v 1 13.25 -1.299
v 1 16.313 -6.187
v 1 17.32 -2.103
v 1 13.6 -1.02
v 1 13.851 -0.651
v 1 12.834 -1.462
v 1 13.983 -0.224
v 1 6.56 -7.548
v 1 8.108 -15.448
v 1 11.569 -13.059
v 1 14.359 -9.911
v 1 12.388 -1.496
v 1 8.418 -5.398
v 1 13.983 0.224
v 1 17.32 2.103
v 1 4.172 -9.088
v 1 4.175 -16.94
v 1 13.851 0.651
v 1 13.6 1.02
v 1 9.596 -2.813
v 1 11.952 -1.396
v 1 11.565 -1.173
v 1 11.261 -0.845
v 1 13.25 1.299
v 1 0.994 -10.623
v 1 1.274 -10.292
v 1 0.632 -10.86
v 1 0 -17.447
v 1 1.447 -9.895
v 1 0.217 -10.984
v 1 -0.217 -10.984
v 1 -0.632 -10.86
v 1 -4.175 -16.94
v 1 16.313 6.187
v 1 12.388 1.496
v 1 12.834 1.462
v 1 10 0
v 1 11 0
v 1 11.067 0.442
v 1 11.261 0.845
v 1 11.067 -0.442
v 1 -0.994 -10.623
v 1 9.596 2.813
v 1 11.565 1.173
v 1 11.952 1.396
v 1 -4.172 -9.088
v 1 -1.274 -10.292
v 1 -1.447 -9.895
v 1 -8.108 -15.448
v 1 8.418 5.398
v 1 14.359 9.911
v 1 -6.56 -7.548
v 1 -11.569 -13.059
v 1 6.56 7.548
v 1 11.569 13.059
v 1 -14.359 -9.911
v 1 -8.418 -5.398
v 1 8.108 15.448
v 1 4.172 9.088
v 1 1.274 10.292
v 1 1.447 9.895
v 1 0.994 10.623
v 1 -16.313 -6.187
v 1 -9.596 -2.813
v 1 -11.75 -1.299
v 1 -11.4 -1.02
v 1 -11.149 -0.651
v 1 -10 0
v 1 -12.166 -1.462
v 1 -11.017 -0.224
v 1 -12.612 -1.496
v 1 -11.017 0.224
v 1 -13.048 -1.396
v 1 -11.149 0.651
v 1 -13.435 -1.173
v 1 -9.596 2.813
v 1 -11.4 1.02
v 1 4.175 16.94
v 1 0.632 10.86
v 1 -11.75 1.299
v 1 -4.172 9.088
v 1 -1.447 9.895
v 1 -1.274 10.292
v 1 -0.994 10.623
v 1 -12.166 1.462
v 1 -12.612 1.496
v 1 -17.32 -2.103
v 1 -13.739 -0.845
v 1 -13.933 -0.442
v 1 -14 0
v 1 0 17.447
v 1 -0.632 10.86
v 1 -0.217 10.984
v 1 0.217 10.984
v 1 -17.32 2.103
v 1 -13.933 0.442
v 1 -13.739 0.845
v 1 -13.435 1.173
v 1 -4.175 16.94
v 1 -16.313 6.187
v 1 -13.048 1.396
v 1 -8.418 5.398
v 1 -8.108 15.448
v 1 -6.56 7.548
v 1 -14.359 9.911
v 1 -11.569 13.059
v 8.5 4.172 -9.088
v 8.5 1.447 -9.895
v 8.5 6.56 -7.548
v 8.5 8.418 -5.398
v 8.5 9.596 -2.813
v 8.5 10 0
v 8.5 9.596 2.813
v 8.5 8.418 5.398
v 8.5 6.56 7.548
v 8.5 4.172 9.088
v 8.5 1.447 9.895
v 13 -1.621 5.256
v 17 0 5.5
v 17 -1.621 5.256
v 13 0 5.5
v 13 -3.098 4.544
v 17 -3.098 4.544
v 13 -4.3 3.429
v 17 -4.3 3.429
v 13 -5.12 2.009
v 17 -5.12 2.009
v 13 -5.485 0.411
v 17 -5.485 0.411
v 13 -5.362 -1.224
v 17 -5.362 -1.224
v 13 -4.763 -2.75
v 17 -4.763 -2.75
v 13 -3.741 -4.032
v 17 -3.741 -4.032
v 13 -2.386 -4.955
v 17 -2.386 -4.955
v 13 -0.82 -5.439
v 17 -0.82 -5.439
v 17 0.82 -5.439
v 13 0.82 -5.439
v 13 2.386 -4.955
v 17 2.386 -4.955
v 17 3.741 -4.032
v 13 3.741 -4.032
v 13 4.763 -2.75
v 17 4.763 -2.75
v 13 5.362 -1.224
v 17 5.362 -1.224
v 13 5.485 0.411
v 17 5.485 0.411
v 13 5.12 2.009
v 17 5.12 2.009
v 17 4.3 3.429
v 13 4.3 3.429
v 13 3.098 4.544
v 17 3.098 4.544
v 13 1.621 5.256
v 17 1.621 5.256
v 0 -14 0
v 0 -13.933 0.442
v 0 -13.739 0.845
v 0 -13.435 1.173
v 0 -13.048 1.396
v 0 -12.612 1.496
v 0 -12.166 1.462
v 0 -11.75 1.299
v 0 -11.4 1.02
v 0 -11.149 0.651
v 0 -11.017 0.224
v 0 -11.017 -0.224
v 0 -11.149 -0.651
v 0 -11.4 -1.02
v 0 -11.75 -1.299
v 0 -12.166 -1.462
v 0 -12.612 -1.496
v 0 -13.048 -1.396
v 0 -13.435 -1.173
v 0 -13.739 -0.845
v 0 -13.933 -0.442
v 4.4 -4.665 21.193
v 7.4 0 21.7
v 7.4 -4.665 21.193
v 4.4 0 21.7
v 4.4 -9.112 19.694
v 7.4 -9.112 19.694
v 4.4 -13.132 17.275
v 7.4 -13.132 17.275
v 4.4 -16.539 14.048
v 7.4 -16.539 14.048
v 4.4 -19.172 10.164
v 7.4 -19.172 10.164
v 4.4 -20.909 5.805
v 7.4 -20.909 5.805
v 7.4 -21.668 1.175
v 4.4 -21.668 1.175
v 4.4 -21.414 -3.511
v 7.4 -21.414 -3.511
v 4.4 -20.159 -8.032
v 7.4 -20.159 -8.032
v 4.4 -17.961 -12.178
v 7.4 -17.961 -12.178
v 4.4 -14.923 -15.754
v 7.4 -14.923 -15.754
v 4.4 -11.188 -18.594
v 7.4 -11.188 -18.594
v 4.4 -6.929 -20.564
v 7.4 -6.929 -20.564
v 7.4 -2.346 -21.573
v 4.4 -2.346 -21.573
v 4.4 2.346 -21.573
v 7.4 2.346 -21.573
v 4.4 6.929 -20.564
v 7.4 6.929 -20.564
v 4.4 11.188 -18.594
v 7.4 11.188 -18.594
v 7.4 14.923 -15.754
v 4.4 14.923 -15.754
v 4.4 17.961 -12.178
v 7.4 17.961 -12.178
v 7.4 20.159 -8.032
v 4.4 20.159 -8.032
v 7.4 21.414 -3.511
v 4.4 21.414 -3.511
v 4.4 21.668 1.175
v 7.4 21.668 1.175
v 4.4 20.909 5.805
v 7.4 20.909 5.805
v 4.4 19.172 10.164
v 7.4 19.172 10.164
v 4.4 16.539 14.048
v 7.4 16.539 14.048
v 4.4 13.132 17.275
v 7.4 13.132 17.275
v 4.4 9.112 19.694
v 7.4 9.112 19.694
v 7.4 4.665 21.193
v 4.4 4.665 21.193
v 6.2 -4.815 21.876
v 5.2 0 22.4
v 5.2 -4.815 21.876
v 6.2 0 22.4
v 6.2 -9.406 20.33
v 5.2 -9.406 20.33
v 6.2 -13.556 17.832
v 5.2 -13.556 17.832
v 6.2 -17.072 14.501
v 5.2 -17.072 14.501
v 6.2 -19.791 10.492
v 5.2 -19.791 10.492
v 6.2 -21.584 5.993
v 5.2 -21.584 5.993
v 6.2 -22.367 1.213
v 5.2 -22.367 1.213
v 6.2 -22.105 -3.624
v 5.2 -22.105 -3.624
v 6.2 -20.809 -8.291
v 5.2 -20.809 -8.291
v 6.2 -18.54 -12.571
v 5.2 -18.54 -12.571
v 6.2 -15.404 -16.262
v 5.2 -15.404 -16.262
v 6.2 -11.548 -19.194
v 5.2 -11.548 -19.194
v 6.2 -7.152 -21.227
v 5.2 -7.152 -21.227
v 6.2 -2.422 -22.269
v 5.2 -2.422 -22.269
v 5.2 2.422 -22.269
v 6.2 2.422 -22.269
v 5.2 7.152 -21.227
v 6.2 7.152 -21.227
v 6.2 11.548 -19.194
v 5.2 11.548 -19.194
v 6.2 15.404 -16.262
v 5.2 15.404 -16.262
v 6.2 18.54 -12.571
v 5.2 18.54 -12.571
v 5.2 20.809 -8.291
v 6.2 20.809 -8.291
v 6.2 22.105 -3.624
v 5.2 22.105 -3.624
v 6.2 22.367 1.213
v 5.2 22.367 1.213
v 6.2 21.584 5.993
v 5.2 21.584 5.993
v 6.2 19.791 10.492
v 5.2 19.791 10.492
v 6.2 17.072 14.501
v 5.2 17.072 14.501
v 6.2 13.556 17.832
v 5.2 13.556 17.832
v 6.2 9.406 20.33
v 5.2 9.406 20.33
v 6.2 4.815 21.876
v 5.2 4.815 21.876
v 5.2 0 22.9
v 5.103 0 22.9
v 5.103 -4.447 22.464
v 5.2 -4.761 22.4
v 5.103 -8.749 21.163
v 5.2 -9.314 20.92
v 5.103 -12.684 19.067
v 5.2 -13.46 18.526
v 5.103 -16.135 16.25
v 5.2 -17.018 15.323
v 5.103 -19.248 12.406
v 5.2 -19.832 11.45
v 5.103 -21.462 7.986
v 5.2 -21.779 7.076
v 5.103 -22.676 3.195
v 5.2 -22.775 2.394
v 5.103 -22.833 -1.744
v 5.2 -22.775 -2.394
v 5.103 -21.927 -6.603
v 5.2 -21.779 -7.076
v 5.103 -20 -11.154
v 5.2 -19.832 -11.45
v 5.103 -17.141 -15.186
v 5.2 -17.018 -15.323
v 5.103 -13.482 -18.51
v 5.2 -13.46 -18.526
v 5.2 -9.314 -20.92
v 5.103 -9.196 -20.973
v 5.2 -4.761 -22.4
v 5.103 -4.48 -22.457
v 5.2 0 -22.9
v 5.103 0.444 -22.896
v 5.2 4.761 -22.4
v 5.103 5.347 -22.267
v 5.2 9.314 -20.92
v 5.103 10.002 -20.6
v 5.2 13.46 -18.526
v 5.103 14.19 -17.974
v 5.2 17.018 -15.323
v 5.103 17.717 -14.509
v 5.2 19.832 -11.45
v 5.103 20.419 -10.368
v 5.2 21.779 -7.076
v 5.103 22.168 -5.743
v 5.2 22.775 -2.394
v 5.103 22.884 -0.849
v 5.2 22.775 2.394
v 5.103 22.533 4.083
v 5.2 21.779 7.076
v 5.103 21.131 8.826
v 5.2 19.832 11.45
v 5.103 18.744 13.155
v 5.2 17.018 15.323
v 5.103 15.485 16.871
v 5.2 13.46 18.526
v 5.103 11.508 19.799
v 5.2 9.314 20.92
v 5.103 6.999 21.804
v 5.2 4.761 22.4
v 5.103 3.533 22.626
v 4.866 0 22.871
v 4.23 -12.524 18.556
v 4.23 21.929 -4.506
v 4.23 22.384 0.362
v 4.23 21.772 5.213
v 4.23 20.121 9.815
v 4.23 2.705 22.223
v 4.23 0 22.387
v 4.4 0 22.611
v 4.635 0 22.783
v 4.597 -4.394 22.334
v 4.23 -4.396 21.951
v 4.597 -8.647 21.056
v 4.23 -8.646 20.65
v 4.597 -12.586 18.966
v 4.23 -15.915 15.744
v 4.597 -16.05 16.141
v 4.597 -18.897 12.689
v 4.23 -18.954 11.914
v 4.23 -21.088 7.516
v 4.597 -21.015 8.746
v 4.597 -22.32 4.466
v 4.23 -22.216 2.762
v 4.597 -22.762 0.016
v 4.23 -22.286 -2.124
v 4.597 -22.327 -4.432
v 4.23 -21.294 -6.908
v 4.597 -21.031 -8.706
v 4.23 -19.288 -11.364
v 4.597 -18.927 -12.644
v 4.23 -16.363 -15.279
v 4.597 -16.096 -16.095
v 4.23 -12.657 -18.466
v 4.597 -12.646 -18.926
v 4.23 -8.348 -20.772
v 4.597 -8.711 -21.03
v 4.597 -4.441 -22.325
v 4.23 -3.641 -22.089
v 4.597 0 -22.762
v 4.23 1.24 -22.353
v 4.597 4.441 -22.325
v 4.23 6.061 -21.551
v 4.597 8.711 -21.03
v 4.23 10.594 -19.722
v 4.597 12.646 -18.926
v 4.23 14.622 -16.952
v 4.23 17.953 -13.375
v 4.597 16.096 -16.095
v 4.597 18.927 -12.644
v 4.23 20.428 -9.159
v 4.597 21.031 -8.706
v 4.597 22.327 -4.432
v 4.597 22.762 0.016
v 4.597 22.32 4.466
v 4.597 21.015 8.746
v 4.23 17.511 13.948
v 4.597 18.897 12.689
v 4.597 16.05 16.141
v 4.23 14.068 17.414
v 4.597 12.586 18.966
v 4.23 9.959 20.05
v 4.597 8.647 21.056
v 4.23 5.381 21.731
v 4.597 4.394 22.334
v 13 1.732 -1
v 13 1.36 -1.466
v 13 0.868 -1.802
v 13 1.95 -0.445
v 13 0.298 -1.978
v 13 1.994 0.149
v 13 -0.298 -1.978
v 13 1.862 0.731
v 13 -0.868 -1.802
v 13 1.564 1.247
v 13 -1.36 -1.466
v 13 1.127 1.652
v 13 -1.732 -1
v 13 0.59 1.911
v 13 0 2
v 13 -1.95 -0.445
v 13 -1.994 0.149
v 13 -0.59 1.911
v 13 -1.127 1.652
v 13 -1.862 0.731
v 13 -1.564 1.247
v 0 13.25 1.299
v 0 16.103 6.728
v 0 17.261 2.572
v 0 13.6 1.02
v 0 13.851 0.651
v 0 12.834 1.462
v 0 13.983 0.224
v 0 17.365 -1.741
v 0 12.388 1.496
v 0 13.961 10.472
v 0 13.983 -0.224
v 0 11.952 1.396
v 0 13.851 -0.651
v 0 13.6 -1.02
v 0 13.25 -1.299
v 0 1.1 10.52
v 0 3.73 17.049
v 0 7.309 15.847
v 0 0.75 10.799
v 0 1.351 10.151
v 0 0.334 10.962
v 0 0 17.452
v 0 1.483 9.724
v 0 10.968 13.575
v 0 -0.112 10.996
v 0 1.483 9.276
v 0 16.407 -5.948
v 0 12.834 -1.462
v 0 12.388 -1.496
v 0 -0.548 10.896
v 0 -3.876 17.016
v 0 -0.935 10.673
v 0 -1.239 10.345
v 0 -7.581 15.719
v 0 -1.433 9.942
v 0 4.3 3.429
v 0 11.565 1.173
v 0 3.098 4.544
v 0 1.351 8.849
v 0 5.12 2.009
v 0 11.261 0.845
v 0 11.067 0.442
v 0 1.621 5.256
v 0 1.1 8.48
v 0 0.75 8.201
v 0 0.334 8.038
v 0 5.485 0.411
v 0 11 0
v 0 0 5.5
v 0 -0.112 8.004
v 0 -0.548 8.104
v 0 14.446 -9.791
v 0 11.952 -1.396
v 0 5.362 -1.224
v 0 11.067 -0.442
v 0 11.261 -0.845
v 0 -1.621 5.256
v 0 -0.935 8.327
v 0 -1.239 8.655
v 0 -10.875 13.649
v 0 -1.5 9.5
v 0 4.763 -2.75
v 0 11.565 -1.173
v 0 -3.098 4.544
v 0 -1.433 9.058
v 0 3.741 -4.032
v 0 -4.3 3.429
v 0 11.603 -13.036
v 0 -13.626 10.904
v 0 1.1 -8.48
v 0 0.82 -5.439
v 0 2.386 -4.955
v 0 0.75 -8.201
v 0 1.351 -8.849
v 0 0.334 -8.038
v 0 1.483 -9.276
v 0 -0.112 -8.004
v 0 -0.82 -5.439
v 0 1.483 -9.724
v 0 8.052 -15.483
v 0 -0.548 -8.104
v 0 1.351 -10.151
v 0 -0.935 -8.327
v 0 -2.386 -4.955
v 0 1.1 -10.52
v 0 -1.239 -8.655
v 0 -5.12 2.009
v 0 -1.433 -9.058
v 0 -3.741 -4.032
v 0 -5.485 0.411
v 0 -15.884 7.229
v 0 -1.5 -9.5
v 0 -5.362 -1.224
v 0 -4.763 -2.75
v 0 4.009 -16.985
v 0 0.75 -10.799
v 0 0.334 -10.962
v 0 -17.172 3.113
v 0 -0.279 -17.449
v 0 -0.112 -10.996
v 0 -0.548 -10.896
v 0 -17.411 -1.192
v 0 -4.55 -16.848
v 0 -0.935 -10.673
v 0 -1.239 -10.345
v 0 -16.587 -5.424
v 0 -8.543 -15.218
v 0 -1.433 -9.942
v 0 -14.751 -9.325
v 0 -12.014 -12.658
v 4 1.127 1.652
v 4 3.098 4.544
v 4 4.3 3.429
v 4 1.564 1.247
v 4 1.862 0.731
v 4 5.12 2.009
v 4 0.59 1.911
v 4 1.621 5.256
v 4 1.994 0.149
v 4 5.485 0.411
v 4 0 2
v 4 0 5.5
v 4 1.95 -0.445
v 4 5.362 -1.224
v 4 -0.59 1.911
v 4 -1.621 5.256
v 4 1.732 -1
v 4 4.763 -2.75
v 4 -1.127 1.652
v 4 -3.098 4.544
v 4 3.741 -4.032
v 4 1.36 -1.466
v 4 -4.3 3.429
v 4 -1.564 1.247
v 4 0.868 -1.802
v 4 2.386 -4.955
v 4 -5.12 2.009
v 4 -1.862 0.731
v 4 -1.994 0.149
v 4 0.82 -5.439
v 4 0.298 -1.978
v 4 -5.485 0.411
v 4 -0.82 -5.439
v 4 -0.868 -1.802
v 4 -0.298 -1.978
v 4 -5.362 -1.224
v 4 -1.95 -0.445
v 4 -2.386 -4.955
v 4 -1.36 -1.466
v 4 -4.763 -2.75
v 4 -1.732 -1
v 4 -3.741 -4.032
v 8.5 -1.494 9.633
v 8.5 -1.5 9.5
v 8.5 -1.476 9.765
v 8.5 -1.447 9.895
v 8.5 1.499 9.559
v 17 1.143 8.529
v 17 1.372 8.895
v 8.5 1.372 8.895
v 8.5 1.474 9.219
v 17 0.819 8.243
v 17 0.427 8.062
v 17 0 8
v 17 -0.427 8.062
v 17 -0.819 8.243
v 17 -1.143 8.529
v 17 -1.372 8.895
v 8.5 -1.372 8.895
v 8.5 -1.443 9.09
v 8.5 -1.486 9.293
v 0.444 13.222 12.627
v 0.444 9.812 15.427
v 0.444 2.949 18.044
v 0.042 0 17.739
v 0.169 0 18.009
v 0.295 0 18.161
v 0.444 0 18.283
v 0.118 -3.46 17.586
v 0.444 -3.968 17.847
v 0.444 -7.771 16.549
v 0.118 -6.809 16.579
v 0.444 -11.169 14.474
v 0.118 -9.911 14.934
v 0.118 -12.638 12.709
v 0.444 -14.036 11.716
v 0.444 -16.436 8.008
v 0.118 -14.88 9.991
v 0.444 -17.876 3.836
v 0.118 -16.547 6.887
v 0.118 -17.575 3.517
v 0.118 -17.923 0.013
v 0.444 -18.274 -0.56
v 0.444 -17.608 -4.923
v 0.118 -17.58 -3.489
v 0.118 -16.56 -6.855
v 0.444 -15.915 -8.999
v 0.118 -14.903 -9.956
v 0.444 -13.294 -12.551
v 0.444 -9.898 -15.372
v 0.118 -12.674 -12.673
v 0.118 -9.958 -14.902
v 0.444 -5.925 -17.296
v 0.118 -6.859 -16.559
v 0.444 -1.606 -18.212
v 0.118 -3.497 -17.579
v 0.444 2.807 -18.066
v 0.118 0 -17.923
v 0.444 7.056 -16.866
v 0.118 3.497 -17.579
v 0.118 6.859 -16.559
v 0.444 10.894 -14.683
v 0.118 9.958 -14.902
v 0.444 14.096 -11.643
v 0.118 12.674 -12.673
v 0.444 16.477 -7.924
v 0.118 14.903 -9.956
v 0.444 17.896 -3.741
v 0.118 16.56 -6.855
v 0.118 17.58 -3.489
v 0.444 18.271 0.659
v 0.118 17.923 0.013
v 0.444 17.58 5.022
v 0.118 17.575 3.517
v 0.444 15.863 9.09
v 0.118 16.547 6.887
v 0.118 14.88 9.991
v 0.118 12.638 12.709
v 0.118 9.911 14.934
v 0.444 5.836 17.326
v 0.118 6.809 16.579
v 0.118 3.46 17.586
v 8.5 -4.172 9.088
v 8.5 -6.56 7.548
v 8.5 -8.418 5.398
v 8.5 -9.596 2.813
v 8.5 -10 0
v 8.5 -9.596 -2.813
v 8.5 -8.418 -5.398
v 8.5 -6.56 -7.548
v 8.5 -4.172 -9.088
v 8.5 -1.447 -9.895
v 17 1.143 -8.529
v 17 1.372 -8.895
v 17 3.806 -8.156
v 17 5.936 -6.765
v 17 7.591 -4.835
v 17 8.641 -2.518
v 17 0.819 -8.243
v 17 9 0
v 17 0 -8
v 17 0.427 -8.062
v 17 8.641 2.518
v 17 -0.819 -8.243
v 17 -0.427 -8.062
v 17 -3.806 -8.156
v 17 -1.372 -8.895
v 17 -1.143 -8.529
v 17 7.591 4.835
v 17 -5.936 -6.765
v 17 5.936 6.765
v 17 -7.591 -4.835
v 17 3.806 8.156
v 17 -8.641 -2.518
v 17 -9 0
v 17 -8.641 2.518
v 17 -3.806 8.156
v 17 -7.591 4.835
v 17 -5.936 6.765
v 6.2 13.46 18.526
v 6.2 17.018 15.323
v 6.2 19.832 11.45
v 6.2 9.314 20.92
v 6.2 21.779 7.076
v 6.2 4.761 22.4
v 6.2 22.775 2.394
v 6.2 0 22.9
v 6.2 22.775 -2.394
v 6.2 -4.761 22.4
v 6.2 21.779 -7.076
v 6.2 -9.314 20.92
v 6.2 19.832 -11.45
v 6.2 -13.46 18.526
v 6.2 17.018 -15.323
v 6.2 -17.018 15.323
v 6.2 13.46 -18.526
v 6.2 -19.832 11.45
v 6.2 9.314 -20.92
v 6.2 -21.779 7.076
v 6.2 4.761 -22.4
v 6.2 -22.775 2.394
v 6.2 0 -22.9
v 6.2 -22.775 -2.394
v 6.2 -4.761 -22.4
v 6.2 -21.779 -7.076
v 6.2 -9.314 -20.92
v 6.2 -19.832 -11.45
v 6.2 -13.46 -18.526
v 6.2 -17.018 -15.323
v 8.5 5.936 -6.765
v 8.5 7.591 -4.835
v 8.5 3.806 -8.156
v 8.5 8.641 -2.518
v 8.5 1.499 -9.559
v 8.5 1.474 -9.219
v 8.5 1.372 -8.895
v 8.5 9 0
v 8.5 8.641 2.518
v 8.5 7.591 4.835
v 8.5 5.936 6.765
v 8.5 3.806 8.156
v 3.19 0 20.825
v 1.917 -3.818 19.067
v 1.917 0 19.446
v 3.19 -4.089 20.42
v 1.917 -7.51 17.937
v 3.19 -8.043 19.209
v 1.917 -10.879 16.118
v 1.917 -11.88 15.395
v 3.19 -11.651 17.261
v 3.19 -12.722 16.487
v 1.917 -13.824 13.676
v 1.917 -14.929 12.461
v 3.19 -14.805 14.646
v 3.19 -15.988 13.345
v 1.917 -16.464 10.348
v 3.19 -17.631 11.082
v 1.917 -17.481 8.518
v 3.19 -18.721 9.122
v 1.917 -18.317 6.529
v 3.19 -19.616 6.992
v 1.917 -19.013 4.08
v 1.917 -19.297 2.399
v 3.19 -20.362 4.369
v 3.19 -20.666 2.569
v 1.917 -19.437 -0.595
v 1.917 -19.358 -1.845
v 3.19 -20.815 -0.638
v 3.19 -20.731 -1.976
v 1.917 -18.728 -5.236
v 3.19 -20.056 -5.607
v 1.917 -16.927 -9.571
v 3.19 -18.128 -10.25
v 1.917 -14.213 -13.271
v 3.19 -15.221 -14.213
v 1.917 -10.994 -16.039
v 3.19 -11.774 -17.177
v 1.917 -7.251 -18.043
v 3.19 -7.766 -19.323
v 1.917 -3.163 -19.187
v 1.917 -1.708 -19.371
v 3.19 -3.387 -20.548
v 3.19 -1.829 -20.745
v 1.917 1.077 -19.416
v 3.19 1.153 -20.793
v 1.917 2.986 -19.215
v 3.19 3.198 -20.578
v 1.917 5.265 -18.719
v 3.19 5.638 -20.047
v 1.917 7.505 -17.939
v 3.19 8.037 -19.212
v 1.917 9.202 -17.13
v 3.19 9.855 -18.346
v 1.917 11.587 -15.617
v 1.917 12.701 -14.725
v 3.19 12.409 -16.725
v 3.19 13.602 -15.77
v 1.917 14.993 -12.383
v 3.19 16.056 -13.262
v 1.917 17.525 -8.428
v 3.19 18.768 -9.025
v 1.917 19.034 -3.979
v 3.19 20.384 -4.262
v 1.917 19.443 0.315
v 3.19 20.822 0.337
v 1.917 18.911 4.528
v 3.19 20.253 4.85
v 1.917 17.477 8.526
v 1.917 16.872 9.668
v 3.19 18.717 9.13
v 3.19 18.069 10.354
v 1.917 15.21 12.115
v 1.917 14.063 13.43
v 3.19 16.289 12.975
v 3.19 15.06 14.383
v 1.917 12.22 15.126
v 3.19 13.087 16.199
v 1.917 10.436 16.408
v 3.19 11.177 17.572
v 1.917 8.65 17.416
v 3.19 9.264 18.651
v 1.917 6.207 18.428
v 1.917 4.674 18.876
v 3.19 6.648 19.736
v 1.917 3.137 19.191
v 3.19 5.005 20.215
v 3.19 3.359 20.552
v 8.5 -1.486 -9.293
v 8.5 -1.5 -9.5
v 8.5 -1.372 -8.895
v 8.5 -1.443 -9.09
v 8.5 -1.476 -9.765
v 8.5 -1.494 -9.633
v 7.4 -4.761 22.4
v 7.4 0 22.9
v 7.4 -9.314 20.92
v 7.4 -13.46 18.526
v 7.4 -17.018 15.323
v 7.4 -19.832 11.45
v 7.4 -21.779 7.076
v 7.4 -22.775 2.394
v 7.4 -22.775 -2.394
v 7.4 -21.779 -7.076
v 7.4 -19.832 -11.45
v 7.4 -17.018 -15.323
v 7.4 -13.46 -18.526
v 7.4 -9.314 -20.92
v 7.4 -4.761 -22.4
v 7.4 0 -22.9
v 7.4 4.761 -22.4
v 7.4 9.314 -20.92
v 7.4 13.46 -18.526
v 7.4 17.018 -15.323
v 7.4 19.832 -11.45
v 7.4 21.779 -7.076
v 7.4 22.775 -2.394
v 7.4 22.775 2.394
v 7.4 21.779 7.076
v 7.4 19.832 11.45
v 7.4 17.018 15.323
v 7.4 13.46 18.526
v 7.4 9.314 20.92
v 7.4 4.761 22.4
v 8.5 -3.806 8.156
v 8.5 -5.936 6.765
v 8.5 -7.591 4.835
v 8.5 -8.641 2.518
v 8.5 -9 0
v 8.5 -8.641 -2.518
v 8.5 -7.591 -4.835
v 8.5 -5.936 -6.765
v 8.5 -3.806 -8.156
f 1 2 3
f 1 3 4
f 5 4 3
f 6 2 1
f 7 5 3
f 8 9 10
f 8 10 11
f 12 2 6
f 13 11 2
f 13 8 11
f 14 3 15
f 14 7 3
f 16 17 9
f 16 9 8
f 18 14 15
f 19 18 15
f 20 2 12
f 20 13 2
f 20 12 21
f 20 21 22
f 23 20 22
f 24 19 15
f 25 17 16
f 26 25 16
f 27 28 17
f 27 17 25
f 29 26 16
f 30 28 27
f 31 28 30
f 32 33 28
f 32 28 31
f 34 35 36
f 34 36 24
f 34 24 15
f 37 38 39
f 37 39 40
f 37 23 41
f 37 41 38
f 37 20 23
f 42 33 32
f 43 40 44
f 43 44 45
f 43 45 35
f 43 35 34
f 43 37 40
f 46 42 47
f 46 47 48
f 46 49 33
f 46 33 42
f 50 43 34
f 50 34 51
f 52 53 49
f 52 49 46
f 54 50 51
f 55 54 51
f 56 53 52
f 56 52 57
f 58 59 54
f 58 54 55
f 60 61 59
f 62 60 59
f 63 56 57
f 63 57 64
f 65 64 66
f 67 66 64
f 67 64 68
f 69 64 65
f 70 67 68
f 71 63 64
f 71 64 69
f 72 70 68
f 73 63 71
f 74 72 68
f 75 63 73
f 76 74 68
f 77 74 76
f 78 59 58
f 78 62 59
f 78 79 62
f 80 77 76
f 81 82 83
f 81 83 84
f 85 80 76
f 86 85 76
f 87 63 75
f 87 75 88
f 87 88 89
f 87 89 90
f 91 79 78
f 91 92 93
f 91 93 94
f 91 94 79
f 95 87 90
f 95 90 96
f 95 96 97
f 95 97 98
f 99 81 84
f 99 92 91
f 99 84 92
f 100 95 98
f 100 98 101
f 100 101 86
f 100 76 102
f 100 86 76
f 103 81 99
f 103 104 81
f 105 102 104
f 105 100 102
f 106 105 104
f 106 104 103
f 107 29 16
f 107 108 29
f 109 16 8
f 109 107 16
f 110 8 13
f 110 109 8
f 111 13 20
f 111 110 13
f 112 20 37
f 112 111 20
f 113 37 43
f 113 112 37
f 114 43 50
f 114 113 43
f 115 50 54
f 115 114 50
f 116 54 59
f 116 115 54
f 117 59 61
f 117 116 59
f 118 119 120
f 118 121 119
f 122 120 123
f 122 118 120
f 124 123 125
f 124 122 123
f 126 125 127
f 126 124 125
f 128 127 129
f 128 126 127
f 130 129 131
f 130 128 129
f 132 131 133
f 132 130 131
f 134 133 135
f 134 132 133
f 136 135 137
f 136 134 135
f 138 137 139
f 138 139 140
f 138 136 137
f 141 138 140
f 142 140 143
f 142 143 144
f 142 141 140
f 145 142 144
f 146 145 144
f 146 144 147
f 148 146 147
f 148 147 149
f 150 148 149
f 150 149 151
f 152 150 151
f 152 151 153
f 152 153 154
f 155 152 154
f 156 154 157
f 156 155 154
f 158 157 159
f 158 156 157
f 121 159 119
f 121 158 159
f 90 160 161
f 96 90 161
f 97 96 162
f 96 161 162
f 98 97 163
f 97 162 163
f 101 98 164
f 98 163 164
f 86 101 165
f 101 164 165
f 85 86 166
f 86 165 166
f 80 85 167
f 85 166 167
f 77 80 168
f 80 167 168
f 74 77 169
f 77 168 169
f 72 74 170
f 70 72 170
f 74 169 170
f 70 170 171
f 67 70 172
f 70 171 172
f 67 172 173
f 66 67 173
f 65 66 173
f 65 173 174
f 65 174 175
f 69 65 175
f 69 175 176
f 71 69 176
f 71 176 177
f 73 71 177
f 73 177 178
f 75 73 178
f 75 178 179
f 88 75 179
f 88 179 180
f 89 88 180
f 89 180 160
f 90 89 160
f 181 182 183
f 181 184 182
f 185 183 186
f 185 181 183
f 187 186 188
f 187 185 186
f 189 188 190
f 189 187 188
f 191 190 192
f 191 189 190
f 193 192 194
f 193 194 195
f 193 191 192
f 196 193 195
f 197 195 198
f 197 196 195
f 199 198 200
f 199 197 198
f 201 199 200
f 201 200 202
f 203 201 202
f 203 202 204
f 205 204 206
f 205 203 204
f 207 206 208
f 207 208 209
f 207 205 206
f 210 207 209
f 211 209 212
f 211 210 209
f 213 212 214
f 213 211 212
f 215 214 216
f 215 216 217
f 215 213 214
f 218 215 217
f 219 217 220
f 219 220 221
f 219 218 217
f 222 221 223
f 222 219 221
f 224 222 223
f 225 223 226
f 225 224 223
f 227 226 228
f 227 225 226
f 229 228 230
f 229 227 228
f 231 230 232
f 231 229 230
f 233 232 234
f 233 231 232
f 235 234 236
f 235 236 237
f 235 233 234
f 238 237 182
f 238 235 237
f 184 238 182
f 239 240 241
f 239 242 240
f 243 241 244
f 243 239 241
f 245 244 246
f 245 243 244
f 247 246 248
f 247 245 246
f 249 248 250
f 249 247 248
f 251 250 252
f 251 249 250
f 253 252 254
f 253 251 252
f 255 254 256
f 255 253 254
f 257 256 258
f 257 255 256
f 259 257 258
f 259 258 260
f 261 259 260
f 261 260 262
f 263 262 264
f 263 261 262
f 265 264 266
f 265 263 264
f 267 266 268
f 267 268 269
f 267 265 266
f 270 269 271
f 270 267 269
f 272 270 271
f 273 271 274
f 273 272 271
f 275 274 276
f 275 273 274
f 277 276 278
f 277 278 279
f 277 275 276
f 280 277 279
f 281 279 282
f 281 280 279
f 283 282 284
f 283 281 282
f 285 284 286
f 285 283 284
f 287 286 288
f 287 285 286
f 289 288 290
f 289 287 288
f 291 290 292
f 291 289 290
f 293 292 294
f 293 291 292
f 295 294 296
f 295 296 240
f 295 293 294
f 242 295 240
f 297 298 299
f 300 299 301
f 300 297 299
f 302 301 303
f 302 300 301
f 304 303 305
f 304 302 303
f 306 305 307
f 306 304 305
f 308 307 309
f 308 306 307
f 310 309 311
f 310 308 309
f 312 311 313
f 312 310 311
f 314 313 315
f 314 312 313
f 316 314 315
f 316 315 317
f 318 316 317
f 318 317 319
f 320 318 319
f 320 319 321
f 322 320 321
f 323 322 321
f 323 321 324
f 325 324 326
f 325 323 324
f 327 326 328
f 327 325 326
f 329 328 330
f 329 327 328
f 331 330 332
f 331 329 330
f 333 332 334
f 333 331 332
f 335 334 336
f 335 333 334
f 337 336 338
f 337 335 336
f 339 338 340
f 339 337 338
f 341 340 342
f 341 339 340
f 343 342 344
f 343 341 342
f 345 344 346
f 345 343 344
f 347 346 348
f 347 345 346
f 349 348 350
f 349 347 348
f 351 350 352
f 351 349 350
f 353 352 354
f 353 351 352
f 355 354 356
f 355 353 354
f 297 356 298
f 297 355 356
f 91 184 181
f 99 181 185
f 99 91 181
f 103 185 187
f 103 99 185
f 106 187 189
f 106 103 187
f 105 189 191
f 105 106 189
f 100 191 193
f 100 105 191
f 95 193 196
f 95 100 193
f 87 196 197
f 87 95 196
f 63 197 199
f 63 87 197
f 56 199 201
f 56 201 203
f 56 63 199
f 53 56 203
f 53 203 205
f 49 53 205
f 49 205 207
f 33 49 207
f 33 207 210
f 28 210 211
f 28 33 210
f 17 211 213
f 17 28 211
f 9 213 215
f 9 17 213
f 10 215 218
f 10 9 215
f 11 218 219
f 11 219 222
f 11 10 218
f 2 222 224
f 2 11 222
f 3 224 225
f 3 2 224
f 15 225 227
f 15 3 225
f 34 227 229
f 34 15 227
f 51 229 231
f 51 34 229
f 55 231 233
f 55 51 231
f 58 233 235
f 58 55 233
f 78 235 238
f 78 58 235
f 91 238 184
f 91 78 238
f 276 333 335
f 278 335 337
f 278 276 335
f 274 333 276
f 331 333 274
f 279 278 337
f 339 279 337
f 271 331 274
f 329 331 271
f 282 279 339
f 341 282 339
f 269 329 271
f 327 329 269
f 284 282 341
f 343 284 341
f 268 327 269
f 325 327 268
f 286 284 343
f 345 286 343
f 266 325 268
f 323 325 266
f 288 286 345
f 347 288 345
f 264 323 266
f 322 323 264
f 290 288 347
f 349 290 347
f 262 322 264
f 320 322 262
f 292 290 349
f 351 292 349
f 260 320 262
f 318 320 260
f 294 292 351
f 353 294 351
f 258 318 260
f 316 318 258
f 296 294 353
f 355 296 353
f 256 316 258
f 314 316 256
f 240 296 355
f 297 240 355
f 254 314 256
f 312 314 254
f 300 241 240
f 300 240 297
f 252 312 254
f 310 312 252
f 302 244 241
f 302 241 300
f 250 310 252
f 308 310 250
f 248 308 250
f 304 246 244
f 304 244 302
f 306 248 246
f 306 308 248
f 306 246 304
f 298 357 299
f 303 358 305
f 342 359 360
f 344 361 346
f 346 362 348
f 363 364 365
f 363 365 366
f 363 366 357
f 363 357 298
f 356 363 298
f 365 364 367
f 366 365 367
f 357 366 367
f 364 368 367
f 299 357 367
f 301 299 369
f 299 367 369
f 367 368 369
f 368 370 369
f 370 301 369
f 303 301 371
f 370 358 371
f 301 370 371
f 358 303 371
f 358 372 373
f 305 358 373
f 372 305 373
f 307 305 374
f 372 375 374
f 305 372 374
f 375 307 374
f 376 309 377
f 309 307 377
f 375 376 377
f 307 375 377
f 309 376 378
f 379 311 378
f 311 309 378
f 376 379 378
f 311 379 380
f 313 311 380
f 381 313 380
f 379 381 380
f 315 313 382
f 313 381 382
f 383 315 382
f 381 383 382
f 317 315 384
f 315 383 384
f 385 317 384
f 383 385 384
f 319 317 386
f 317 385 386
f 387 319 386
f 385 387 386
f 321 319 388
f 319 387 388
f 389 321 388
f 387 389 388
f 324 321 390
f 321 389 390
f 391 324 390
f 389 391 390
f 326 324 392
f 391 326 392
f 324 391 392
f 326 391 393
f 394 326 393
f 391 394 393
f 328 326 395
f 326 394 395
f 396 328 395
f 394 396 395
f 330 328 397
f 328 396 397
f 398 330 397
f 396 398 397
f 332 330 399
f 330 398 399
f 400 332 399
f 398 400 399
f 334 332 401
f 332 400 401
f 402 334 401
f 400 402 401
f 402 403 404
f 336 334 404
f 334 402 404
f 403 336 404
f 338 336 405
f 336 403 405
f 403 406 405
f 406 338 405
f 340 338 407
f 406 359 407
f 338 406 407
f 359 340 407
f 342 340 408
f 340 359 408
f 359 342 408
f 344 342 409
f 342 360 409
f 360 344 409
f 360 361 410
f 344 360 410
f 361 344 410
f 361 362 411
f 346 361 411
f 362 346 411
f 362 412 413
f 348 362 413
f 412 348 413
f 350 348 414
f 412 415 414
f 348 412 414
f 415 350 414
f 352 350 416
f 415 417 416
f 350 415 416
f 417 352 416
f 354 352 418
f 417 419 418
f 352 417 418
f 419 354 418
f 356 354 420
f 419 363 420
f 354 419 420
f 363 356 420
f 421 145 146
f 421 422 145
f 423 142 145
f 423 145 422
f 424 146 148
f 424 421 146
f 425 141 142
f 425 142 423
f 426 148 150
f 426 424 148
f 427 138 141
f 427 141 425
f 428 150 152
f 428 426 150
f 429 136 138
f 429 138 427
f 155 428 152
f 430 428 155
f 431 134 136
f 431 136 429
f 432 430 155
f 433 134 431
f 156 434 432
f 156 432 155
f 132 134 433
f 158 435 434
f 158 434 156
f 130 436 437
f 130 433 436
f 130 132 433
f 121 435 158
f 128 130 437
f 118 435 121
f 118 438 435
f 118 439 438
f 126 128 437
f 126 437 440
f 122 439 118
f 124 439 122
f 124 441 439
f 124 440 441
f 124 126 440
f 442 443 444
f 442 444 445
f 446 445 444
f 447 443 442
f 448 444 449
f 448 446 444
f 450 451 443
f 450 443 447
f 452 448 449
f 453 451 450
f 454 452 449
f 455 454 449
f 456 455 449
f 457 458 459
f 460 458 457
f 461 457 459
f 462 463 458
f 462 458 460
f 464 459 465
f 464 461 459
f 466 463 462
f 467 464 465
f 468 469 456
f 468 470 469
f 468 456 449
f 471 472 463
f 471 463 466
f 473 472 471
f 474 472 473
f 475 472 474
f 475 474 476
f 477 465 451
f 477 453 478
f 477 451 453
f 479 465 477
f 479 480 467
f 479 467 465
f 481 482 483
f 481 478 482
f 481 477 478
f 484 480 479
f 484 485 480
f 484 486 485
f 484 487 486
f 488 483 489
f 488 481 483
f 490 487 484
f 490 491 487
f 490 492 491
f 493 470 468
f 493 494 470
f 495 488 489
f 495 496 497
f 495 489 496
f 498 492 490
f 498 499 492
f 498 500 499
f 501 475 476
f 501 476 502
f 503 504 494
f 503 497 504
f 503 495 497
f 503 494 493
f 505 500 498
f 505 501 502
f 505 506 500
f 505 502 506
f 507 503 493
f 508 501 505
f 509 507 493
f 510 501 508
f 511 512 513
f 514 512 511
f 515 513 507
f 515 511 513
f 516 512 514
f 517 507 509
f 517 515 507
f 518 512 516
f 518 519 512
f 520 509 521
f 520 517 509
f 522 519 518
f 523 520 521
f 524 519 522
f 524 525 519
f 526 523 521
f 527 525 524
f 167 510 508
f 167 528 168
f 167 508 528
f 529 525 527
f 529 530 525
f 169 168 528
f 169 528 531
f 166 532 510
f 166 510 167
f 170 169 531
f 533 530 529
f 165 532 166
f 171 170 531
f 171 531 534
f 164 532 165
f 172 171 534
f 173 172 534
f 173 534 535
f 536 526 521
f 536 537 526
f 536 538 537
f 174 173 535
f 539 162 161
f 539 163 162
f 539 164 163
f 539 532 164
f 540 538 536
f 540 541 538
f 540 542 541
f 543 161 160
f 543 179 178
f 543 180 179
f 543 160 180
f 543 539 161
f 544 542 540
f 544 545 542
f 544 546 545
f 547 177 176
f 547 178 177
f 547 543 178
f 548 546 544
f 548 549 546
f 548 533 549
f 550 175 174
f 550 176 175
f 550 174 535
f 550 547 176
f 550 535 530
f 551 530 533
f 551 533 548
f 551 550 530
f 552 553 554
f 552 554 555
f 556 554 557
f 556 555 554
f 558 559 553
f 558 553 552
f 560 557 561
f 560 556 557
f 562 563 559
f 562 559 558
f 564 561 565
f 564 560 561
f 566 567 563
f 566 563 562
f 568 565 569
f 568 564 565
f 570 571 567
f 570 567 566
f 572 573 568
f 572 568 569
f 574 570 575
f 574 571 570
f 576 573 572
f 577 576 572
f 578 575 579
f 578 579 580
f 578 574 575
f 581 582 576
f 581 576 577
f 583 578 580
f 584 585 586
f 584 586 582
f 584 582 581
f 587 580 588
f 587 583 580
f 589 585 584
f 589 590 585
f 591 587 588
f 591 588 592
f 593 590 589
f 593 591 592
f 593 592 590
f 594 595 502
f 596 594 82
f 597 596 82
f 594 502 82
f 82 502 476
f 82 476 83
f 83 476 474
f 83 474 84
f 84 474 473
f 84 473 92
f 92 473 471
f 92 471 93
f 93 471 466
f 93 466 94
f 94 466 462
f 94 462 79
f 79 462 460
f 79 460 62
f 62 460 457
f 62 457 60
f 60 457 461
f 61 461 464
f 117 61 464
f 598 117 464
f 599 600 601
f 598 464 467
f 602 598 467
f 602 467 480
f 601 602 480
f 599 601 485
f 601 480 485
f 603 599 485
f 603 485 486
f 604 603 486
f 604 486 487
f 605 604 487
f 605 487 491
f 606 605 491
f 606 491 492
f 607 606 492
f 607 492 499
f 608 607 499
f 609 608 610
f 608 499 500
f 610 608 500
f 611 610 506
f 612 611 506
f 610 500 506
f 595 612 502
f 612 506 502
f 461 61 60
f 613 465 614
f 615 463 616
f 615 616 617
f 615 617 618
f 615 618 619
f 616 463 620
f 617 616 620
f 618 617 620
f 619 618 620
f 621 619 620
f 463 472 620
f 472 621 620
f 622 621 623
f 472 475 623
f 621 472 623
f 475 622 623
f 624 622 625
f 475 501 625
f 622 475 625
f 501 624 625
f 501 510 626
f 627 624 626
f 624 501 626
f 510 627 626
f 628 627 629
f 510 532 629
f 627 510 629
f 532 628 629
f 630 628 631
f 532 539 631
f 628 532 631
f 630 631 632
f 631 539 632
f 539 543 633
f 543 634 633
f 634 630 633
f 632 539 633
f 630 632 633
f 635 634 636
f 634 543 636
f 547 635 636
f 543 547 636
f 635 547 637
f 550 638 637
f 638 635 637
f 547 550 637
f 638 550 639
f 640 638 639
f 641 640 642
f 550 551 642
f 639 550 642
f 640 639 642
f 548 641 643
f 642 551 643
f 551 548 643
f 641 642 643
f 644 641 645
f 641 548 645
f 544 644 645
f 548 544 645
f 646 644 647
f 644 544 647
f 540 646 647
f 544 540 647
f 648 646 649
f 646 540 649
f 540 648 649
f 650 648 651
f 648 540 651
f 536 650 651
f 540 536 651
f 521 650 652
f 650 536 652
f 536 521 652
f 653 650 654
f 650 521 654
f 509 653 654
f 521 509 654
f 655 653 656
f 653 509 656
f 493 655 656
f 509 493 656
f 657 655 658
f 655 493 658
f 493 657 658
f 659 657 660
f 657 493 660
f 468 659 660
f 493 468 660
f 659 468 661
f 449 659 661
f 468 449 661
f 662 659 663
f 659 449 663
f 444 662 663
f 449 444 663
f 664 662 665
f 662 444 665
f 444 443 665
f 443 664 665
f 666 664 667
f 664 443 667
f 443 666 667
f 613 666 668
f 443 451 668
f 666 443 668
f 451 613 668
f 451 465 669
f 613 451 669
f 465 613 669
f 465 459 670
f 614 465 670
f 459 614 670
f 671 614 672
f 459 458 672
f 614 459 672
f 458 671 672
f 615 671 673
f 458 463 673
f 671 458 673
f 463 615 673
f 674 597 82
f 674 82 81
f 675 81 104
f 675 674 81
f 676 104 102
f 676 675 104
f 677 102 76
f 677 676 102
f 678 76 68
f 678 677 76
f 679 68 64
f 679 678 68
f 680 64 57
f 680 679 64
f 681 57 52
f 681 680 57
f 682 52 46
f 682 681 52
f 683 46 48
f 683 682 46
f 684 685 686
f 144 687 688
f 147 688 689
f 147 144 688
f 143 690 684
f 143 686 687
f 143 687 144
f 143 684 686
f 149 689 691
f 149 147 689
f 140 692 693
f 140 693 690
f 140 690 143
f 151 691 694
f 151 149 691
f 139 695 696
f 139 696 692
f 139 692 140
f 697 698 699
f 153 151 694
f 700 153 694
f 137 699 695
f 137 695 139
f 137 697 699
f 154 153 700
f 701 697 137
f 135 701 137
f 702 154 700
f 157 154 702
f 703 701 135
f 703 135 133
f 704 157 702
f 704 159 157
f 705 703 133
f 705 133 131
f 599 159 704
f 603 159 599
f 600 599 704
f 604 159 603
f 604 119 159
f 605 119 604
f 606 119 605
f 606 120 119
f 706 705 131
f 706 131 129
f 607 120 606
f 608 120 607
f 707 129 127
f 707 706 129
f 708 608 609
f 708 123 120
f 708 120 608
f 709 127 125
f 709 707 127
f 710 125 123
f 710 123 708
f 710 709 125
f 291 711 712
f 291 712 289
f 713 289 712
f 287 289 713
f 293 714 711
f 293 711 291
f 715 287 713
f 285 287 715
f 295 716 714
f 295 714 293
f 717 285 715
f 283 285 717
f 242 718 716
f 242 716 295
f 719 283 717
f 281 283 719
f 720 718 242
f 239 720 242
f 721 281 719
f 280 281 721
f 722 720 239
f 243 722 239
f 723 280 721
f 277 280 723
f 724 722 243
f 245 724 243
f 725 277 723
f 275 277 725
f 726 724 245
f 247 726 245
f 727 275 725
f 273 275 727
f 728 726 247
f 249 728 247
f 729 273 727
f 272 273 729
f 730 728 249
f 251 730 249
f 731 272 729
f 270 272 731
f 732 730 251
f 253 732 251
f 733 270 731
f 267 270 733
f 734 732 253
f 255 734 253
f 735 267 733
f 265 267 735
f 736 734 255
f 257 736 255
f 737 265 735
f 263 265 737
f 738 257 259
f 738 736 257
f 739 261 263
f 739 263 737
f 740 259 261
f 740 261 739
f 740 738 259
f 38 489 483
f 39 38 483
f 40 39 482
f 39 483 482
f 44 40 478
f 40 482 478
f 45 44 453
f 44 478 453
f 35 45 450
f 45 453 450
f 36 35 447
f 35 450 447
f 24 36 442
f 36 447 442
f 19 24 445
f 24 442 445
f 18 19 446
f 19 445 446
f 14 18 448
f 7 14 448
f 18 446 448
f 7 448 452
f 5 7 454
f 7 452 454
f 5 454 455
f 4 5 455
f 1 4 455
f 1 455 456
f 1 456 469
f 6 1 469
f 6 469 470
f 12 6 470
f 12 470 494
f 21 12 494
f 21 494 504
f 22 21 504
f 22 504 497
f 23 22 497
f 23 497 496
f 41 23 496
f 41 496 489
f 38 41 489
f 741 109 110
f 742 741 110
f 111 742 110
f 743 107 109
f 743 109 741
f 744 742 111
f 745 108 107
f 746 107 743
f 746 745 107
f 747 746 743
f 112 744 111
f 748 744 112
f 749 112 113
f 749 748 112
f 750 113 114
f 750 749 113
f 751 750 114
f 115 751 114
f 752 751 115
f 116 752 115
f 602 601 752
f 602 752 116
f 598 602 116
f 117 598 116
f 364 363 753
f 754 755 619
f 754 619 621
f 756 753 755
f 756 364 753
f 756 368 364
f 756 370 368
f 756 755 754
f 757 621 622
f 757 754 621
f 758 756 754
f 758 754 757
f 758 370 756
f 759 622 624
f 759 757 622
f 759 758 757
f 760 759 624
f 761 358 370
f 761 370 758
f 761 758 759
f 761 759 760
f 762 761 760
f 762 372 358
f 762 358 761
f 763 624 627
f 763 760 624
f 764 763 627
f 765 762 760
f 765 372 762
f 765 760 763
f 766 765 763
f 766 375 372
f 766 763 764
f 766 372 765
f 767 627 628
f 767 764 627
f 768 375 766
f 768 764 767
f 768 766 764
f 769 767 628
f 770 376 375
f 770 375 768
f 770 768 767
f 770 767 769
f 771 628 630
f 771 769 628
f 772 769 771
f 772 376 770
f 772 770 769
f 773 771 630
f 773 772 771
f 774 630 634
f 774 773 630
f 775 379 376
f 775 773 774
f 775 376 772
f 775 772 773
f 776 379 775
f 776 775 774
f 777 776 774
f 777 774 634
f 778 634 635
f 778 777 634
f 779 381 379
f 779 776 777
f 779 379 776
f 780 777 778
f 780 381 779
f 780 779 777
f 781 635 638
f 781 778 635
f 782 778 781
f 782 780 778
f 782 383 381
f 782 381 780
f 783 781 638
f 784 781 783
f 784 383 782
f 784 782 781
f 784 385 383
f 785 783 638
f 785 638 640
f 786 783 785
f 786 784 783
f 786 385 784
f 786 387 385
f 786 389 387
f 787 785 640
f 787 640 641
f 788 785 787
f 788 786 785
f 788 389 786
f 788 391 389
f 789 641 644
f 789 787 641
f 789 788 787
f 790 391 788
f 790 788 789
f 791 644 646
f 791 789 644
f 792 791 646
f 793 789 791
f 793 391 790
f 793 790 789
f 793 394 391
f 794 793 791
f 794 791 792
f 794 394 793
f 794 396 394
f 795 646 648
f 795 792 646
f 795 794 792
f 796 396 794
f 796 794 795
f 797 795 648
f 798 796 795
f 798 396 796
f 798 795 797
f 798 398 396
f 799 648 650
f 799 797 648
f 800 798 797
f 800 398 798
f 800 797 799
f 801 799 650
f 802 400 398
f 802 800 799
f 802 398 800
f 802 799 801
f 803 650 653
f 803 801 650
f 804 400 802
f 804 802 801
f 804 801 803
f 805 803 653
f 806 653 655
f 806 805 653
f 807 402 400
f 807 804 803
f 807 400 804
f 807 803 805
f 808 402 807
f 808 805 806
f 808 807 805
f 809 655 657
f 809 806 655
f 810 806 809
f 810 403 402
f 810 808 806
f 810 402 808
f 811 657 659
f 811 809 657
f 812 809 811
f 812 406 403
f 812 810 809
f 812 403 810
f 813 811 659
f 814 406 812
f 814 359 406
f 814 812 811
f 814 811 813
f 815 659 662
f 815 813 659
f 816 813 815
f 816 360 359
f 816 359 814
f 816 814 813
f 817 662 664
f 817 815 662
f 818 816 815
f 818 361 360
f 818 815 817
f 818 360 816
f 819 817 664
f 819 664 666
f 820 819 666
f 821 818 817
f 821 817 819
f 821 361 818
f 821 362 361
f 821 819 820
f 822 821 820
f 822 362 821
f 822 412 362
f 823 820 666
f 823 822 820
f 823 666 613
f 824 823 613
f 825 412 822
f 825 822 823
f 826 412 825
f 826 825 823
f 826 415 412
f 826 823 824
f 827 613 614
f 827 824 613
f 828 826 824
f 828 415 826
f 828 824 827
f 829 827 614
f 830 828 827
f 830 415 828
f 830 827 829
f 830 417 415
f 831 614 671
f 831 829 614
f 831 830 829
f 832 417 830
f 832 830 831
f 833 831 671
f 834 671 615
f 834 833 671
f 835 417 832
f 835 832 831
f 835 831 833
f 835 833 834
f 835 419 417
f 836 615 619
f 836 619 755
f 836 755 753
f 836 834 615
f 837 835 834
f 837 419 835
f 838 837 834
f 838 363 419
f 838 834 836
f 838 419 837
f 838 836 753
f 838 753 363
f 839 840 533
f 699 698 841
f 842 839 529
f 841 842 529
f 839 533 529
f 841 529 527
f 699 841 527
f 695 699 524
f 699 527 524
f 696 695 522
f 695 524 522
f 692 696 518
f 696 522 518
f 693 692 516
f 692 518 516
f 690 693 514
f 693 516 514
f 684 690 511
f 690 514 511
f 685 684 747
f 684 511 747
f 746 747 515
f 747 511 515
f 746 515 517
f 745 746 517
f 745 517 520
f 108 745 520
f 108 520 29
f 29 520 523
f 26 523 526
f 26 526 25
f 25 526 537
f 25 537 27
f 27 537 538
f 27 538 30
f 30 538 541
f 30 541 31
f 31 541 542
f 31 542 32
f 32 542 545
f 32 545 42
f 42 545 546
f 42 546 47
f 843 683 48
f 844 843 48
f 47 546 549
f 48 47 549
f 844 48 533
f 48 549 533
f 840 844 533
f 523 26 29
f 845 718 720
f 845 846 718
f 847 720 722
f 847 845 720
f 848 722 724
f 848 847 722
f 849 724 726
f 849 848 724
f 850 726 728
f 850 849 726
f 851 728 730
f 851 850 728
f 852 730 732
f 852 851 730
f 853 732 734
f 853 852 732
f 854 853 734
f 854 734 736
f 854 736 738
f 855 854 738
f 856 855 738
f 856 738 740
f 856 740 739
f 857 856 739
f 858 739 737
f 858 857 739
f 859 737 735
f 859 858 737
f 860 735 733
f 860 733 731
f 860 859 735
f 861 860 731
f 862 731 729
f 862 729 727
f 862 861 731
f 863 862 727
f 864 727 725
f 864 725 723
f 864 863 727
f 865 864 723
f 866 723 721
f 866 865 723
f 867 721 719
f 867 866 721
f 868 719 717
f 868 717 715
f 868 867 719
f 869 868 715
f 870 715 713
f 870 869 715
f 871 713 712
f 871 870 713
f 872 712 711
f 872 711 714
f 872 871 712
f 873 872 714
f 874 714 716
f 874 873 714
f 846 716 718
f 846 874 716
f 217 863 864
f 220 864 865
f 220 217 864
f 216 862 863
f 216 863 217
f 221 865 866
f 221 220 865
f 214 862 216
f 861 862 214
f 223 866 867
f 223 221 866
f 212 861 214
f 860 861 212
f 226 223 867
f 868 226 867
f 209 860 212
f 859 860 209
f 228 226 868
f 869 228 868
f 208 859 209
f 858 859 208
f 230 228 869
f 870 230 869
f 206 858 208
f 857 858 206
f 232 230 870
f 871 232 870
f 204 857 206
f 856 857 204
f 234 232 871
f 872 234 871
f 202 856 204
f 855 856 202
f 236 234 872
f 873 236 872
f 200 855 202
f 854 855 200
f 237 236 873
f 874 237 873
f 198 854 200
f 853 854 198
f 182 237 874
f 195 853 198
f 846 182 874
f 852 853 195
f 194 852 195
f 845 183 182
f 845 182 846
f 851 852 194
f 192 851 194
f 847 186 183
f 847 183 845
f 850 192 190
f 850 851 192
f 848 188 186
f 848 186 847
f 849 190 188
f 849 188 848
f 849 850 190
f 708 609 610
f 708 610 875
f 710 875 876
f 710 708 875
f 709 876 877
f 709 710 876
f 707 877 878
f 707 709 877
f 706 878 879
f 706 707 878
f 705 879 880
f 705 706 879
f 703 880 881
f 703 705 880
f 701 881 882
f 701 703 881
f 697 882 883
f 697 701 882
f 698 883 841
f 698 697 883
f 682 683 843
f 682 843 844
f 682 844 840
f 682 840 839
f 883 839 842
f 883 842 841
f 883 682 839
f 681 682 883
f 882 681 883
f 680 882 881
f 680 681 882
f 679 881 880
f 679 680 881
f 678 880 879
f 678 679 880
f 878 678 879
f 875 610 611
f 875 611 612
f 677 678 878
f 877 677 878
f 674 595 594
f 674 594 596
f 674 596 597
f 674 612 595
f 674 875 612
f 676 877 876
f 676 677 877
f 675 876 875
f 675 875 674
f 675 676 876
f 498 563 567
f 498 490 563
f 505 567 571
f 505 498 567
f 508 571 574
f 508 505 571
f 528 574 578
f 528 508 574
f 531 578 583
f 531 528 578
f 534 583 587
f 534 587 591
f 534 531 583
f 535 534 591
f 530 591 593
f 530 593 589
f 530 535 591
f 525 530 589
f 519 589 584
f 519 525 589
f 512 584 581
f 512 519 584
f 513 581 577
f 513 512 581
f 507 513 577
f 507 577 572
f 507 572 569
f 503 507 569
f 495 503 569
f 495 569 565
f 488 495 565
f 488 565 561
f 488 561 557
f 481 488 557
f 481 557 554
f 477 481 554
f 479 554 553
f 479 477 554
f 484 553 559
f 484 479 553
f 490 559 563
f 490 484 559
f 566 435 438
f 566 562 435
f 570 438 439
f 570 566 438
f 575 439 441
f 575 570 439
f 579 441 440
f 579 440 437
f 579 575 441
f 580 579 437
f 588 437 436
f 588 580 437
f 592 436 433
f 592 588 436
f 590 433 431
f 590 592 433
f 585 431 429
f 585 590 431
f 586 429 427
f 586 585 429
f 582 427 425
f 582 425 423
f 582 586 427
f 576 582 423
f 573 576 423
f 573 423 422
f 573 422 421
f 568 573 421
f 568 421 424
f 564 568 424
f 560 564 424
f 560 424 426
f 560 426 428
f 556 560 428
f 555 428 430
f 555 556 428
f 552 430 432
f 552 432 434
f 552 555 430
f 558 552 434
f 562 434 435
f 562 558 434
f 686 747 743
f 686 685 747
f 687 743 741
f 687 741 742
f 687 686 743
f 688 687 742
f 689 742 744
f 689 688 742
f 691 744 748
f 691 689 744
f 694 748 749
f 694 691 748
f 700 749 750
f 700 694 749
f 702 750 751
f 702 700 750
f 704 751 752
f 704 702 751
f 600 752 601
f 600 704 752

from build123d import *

# Parameters (mm, degrees)
FILLET1_R          = 1
SKETCH3_R          = 1.5
CUT_EXTRUDE2_DEPTH = 37.576222301


with BuildPart() as part:
    # Sketch1 → Revolve1 (revolve)
    with BuildSketch(Plane.XY, mode=Mode.PRIVATE) as revolve1_sk:
        with BuildLine():
            Line((4, 2), (4, 5.5))
            Line((4, 5.5), (0, 5.5))
            Line((0, 5.5), (0, 18))
            ThreePointArc((0, 18), (2.598670777, 20.129792144), (4.5, 22.9))
            Line((4.5, 22.9), (5.2, 22.9))
            Line((5.2, 22.9), (5.2, 22.4))
            Line((5.2, 22.4), (6.2, 22.4))
            Line((6.2, 22.4), (6.2, 22.9))
            Line((6.2, 22.9), (7.4, 22.9))
            Line((7.4, 22.9), (7.4, 21.7))
            Line((7.4, 21.7), (4.4, 21.7))
            Line((4.4, 21.7), (1, 17.446887131))
            Line((1, 17.446887131), (1, 10))
            Line((1, 10), (8.5, 10))
            Line((8.5, 10), (8.5, 9))
            Line((8.5, 9), (17, 9))
            Line((17, 9), (17, 5.5))
            Line((17, 5.5), (13, 5.5))
            Line((13, 5.5), (13, 2))
            Line((13, 2), (4, 2))
        make_face()
    revolve(revolve1_sk.sketch.rotate(Axis((0, 0, 0), (1, 0, 0)), 90), axis=Axis((0, 0, 0), (1, 0, 0)))

    # Fillet1
    fillet1_edges = [part.edges().sort_by_distance(p)[0] for p in [
        (4.5, 0, -22.9),
        (0, 0, -18),
    ]]
    fillet(fillet1_edges, radius=FILLET1_R)

    # Sketch3 → Cut-Extrude2 (cut, through all)
    with BuildSketch(Plane.ZY):
        with Locations(Location((-9.5, 0, 0), (0, 0, 270))):
            Circle(SKETCH3_R)
        with Locations(Location((0, 12.5, 0), (0, 0, 270))):
            Circle(SKETCH3_R)
        with Locations(Location((9.5, 0, 0), (0, 0, 270))):
            Circle(SKETCH3_R)
        with Locations(Location((0, -12.5, 0), (0, 0, 270))):
            Circle(SKETCH3_R)
    extrude(amount=-CUT_EXTRUDE2_DEPTH, mode=Mode.SUBTRACT)


solid = part.part
